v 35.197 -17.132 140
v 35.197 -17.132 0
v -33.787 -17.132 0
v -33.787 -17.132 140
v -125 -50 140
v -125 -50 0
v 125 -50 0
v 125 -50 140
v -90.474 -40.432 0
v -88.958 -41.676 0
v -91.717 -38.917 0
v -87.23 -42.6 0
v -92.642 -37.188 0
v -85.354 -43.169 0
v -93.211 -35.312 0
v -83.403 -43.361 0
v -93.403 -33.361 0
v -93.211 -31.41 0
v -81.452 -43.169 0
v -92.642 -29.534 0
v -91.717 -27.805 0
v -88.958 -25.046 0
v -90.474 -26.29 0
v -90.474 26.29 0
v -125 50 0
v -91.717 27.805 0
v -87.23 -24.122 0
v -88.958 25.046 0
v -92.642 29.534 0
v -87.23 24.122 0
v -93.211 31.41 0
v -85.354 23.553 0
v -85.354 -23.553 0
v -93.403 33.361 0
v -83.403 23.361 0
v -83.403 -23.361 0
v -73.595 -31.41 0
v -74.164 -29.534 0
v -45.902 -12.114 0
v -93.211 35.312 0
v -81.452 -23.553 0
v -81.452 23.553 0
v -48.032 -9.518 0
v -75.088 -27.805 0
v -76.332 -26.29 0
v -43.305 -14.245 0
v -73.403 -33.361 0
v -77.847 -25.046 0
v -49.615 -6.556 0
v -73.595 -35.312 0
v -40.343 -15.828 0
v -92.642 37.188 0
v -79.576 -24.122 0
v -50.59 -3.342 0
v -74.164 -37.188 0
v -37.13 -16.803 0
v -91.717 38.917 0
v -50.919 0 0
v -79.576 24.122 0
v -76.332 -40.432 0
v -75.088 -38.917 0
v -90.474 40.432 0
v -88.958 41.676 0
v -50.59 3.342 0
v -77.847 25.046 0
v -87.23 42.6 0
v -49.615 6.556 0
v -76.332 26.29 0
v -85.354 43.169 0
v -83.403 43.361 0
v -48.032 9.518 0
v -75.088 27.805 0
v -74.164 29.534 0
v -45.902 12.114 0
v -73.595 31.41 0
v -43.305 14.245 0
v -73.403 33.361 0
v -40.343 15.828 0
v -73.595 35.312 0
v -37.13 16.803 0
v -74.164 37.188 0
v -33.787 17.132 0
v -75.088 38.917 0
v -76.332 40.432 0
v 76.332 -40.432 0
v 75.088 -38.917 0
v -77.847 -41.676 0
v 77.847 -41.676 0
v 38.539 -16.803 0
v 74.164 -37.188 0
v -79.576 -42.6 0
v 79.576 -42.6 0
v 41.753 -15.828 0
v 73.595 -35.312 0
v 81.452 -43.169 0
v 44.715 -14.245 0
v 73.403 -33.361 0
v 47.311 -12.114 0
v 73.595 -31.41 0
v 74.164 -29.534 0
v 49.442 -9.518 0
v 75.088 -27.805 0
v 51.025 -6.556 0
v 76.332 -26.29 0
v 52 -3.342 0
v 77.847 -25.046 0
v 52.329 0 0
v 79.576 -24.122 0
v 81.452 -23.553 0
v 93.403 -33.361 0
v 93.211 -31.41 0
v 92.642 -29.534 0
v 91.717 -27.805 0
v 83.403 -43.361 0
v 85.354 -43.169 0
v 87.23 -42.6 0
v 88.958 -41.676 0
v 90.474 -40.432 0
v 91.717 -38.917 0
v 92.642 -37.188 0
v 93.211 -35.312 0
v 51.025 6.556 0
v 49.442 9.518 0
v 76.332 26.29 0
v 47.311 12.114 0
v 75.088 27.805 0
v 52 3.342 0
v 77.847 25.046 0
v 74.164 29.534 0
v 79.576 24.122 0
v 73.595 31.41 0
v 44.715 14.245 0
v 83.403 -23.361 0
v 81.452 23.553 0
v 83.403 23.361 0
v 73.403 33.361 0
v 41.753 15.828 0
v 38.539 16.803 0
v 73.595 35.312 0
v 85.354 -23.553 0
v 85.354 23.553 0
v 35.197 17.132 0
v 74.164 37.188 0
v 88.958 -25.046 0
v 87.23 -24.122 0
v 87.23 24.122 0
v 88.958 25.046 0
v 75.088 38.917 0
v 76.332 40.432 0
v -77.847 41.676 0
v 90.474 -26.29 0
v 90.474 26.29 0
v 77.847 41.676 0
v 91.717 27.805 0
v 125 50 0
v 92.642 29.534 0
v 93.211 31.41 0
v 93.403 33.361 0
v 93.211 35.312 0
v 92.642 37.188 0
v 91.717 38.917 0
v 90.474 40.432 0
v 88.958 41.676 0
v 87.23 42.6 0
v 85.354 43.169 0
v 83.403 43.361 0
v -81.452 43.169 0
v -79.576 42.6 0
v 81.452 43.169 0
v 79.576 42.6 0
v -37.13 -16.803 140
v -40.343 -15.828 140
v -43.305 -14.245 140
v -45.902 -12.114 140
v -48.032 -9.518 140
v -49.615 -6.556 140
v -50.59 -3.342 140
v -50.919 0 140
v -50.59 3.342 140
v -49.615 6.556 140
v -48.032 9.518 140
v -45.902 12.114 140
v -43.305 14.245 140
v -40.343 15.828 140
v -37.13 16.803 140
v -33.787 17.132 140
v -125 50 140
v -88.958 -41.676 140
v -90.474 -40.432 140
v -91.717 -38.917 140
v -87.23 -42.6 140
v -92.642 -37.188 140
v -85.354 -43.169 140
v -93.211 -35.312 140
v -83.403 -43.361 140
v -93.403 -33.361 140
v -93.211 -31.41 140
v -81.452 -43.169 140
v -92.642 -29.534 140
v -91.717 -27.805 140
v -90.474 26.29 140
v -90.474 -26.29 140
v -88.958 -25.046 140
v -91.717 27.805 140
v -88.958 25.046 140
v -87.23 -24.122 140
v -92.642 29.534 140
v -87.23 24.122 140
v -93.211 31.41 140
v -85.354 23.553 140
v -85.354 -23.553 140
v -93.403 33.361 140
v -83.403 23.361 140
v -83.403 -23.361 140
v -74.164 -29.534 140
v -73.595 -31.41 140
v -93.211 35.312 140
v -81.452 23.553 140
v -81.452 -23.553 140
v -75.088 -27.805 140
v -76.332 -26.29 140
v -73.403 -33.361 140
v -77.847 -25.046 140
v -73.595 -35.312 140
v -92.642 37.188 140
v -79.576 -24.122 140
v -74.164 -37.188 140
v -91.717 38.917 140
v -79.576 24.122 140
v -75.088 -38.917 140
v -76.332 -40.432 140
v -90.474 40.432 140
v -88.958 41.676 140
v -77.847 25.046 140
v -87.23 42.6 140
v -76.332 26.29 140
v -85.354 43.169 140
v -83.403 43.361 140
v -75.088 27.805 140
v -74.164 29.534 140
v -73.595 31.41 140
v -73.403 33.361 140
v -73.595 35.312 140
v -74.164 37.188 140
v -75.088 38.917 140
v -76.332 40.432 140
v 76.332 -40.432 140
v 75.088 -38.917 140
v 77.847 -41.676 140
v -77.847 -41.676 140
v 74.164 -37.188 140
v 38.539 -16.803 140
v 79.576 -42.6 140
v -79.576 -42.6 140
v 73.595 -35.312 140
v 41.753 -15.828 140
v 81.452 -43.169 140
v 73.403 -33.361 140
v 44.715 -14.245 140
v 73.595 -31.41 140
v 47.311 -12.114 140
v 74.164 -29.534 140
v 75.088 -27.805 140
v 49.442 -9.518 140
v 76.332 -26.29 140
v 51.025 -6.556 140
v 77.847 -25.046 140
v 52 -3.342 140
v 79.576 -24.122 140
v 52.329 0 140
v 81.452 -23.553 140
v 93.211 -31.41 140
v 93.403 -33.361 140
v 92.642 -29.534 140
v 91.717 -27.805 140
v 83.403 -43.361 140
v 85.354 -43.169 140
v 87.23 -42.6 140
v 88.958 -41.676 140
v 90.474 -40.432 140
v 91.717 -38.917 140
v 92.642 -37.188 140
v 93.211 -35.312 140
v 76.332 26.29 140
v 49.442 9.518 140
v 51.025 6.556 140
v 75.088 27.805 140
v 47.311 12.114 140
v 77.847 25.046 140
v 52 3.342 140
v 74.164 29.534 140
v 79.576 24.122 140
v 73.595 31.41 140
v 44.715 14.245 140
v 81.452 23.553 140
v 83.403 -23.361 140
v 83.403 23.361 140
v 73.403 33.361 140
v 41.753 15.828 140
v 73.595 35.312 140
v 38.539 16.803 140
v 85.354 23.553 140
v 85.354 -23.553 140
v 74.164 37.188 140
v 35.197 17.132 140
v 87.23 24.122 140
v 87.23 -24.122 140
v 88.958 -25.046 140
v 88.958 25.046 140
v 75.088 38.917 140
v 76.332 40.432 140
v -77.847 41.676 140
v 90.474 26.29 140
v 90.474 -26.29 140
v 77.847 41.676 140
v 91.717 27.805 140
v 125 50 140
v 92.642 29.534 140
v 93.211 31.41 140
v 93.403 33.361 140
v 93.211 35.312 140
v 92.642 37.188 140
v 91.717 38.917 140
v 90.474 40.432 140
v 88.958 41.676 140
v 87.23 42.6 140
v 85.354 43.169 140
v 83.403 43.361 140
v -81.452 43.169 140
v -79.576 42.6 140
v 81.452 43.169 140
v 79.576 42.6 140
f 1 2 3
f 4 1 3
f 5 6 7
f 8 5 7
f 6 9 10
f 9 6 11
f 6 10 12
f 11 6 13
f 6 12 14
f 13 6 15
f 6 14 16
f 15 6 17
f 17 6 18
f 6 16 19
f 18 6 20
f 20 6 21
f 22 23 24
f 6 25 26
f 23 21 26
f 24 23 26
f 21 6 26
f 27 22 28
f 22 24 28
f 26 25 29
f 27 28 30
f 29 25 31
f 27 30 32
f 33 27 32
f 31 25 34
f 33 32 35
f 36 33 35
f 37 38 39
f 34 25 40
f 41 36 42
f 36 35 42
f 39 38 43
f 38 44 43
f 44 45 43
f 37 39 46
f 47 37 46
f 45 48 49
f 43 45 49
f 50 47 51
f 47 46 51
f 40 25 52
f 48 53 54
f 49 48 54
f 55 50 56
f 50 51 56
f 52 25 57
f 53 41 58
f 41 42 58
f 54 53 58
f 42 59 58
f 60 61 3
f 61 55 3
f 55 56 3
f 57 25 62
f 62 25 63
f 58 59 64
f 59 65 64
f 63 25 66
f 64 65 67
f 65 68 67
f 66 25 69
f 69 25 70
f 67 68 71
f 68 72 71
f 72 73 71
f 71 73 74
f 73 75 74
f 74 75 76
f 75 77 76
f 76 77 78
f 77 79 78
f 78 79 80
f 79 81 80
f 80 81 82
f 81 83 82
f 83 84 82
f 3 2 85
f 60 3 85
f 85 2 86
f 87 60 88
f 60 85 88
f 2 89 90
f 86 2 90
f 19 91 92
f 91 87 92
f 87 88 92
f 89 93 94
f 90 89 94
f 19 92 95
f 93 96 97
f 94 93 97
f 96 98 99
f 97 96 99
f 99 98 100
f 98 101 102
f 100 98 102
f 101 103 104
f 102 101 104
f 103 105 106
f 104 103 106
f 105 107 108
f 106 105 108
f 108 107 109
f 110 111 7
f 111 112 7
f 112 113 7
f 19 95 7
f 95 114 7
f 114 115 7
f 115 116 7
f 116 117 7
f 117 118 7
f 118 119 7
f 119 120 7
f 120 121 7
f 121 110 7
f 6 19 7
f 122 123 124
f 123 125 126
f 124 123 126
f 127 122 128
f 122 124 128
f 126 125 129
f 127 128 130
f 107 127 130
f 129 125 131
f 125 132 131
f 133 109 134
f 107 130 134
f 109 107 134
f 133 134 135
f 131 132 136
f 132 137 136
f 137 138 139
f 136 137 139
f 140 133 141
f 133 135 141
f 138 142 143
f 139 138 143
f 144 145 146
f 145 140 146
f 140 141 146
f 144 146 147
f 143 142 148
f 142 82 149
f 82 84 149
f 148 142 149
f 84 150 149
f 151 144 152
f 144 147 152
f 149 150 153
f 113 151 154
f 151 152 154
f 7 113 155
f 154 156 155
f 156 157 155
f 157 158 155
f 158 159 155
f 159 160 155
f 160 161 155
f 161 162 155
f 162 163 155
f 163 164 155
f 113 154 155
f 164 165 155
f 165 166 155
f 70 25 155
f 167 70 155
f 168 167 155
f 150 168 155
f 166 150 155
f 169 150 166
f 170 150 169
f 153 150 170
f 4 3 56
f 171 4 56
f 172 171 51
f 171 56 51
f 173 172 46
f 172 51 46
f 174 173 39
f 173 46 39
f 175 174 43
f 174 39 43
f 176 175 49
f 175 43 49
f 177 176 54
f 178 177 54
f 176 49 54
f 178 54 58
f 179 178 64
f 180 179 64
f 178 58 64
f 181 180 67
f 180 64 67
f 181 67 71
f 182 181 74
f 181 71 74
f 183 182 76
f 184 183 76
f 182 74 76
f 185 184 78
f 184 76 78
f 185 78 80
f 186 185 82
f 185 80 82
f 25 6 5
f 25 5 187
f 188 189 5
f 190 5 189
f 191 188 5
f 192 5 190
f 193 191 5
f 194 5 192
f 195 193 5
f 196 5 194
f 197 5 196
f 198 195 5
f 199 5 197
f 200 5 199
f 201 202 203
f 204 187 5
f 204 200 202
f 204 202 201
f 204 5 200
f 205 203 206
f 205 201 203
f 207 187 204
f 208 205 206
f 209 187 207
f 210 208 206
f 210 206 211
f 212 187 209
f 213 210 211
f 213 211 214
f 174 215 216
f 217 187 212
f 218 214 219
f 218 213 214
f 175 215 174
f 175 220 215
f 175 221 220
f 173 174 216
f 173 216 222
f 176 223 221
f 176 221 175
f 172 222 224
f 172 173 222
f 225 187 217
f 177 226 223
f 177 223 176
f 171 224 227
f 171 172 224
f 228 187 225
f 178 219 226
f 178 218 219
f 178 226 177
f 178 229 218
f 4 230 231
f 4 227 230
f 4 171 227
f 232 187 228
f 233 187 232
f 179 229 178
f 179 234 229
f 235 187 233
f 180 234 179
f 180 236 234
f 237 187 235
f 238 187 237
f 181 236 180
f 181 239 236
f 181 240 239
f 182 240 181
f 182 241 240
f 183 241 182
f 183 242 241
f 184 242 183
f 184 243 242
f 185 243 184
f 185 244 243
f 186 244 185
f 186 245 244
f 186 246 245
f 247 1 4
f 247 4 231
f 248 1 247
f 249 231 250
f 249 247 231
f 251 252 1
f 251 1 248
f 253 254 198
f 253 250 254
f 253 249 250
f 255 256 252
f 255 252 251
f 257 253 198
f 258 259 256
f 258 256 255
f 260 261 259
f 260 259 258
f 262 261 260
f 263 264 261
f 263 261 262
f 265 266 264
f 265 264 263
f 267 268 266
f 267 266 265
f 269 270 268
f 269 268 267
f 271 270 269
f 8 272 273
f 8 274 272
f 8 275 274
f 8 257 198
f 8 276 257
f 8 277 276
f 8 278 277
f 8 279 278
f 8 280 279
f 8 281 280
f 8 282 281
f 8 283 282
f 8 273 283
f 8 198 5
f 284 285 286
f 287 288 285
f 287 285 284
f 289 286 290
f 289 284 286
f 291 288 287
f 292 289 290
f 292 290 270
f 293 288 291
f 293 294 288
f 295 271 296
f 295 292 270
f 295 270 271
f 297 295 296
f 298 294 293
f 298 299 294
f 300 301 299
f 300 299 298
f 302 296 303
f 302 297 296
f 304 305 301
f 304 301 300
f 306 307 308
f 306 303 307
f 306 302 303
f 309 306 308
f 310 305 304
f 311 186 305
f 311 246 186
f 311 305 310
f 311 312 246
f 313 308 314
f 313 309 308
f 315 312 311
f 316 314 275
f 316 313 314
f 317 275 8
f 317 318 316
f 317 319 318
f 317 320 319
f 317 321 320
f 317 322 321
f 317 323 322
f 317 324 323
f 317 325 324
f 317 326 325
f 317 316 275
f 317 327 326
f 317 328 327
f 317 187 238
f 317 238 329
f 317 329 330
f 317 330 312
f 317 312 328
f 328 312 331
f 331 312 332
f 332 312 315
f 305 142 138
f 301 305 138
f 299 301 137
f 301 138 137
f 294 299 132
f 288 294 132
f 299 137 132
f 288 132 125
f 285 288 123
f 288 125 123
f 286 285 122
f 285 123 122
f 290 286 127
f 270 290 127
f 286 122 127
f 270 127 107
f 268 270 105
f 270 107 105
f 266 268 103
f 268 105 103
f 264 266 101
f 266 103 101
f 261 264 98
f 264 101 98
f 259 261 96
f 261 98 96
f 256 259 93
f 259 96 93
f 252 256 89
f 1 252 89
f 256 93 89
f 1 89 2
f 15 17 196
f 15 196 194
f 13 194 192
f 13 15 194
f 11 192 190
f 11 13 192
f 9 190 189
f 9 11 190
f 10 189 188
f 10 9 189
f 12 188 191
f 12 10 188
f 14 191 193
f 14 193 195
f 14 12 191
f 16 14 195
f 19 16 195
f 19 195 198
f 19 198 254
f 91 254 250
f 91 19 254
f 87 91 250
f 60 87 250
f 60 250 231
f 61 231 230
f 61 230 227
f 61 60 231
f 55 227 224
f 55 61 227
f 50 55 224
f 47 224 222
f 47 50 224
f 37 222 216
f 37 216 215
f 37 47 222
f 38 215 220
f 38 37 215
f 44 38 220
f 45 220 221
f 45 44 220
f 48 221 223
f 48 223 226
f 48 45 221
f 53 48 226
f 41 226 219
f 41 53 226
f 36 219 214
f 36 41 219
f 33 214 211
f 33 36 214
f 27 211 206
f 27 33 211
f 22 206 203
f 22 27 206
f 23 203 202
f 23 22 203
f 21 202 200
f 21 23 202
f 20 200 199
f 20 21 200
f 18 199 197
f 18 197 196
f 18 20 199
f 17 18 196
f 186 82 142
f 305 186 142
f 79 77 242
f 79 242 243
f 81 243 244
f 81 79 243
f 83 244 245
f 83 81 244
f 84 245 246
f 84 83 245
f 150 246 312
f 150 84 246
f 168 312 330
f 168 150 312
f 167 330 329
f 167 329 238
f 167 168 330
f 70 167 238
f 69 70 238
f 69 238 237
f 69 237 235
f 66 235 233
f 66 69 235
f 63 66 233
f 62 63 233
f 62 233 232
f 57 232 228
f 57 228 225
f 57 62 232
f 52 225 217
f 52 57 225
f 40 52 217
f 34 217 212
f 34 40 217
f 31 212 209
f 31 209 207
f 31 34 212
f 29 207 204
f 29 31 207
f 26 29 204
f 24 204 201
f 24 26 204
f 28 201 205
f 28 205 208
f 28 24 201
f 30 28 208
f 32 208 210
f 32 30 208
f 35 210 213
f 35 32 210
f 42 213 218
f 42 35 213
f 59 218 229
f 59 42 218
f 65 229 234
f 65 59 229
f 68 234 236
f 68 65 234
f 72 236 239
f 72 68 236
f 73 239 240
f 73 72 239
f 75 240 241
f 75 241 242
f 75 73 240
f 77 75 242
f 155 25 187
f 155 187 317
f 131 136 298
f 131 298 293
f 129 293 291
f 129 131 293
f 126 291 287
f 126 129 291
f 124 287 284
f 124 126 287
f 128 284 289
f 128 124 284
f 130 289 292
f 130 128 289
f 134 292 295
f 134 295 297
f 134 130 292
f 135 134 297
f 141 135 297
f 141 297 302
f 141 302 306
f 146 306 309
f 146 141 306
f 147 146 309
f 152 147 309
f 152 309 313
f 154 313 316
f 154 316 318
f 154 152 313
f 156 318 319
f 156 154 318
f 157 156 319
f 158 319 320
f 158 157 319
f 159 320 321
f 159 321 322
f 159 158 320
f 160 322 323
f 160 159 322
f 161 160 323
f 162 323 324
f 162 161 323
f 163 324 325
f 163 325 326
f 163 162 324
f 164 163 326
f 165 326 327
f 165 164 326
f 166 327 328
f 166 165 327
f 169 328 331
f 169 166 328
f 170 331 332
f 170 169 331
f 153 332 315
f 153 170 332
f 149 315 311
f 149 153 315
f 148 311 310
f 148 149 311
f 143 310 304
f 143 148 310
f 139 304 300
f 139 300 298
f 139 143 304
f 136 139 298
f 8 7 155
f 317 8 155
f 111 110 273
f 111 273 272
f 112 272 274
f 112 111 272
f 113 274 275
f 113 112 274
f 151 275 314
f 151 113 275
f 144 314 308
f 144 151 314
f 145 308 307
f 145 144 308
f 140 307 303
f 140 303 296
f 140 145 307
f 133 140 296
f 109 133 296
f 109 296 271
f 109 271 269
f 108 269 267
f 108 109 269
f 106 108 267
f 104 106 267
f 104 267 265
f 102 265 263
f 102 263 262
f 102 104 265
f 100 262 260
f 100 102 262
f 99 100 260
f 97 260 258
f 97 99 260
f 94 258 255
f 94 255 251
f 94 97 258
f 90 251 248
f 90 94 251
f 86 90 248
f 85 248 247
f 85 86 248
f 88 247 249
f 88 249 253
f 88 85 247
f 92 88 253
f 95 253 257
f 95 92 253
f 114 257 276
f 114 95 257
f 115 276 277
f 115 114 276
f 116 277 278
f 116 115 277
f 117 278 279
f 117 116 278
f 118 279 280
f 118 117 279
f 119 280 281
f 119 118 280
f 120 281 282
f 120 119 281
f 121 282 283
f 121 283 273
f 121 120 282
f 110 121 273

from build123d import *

# Parameters (mm, degrees)
ESQUISSE1_W        = 250
ESQUISSE1_H        = 100
ESQUISSE1_R        = 10
BOSS_EXTRU_1_DEPTH = 140


with BuildPart() as part:
    # Esquisse1 → Boss.-Extru.1 (new body)
    with BuildSketch(Plane.XY):
        Rectangle(ESQUISSE1_W, ESQUISSE1_H)
        with Locations((-83.402754161, 33.361101664)):
            Circle(ESQUISSE1_R, mode=Mode.SUBTRACT)
        with Locations(Location((83.402754161, 33.361101664, 0), (0, 0, 180))):
            Circle(ESQUISSE1_R, mode=Mode.SUBTRACT)
        with Locations((83.402754161, -33.361101664)):
            Circle(ESQUISSE1_R, mode=Mode.SUBTRACT)
        with Locations(Location((-83.402754161, -33.361101664, 0), (0, 0, 180))):
            Circle(ESQUISSE1_R, mode=Mode.SUBTRACT)
        with BuildLine():
            Line((-33.78724139, 17.132226308), (35.196852355, 17.132226308))
            ThreePointArc((35.196852355, 17.132226308), (52.329078664, 0), (35.196852355, -17.132226308))
            Line((35.196852355, -17.132226308), (-33.78724139, -17.132226308))
            ThreePointArc((-33.78724139, -17.132226308), (-50.919467698, 0), (-33.78724139, 17.132226308))
        make_face(mode=Mode.SUBTRACT)
    extrude(amount=BOSS_EXTRU_1_DEPTH)


solid = part.part
